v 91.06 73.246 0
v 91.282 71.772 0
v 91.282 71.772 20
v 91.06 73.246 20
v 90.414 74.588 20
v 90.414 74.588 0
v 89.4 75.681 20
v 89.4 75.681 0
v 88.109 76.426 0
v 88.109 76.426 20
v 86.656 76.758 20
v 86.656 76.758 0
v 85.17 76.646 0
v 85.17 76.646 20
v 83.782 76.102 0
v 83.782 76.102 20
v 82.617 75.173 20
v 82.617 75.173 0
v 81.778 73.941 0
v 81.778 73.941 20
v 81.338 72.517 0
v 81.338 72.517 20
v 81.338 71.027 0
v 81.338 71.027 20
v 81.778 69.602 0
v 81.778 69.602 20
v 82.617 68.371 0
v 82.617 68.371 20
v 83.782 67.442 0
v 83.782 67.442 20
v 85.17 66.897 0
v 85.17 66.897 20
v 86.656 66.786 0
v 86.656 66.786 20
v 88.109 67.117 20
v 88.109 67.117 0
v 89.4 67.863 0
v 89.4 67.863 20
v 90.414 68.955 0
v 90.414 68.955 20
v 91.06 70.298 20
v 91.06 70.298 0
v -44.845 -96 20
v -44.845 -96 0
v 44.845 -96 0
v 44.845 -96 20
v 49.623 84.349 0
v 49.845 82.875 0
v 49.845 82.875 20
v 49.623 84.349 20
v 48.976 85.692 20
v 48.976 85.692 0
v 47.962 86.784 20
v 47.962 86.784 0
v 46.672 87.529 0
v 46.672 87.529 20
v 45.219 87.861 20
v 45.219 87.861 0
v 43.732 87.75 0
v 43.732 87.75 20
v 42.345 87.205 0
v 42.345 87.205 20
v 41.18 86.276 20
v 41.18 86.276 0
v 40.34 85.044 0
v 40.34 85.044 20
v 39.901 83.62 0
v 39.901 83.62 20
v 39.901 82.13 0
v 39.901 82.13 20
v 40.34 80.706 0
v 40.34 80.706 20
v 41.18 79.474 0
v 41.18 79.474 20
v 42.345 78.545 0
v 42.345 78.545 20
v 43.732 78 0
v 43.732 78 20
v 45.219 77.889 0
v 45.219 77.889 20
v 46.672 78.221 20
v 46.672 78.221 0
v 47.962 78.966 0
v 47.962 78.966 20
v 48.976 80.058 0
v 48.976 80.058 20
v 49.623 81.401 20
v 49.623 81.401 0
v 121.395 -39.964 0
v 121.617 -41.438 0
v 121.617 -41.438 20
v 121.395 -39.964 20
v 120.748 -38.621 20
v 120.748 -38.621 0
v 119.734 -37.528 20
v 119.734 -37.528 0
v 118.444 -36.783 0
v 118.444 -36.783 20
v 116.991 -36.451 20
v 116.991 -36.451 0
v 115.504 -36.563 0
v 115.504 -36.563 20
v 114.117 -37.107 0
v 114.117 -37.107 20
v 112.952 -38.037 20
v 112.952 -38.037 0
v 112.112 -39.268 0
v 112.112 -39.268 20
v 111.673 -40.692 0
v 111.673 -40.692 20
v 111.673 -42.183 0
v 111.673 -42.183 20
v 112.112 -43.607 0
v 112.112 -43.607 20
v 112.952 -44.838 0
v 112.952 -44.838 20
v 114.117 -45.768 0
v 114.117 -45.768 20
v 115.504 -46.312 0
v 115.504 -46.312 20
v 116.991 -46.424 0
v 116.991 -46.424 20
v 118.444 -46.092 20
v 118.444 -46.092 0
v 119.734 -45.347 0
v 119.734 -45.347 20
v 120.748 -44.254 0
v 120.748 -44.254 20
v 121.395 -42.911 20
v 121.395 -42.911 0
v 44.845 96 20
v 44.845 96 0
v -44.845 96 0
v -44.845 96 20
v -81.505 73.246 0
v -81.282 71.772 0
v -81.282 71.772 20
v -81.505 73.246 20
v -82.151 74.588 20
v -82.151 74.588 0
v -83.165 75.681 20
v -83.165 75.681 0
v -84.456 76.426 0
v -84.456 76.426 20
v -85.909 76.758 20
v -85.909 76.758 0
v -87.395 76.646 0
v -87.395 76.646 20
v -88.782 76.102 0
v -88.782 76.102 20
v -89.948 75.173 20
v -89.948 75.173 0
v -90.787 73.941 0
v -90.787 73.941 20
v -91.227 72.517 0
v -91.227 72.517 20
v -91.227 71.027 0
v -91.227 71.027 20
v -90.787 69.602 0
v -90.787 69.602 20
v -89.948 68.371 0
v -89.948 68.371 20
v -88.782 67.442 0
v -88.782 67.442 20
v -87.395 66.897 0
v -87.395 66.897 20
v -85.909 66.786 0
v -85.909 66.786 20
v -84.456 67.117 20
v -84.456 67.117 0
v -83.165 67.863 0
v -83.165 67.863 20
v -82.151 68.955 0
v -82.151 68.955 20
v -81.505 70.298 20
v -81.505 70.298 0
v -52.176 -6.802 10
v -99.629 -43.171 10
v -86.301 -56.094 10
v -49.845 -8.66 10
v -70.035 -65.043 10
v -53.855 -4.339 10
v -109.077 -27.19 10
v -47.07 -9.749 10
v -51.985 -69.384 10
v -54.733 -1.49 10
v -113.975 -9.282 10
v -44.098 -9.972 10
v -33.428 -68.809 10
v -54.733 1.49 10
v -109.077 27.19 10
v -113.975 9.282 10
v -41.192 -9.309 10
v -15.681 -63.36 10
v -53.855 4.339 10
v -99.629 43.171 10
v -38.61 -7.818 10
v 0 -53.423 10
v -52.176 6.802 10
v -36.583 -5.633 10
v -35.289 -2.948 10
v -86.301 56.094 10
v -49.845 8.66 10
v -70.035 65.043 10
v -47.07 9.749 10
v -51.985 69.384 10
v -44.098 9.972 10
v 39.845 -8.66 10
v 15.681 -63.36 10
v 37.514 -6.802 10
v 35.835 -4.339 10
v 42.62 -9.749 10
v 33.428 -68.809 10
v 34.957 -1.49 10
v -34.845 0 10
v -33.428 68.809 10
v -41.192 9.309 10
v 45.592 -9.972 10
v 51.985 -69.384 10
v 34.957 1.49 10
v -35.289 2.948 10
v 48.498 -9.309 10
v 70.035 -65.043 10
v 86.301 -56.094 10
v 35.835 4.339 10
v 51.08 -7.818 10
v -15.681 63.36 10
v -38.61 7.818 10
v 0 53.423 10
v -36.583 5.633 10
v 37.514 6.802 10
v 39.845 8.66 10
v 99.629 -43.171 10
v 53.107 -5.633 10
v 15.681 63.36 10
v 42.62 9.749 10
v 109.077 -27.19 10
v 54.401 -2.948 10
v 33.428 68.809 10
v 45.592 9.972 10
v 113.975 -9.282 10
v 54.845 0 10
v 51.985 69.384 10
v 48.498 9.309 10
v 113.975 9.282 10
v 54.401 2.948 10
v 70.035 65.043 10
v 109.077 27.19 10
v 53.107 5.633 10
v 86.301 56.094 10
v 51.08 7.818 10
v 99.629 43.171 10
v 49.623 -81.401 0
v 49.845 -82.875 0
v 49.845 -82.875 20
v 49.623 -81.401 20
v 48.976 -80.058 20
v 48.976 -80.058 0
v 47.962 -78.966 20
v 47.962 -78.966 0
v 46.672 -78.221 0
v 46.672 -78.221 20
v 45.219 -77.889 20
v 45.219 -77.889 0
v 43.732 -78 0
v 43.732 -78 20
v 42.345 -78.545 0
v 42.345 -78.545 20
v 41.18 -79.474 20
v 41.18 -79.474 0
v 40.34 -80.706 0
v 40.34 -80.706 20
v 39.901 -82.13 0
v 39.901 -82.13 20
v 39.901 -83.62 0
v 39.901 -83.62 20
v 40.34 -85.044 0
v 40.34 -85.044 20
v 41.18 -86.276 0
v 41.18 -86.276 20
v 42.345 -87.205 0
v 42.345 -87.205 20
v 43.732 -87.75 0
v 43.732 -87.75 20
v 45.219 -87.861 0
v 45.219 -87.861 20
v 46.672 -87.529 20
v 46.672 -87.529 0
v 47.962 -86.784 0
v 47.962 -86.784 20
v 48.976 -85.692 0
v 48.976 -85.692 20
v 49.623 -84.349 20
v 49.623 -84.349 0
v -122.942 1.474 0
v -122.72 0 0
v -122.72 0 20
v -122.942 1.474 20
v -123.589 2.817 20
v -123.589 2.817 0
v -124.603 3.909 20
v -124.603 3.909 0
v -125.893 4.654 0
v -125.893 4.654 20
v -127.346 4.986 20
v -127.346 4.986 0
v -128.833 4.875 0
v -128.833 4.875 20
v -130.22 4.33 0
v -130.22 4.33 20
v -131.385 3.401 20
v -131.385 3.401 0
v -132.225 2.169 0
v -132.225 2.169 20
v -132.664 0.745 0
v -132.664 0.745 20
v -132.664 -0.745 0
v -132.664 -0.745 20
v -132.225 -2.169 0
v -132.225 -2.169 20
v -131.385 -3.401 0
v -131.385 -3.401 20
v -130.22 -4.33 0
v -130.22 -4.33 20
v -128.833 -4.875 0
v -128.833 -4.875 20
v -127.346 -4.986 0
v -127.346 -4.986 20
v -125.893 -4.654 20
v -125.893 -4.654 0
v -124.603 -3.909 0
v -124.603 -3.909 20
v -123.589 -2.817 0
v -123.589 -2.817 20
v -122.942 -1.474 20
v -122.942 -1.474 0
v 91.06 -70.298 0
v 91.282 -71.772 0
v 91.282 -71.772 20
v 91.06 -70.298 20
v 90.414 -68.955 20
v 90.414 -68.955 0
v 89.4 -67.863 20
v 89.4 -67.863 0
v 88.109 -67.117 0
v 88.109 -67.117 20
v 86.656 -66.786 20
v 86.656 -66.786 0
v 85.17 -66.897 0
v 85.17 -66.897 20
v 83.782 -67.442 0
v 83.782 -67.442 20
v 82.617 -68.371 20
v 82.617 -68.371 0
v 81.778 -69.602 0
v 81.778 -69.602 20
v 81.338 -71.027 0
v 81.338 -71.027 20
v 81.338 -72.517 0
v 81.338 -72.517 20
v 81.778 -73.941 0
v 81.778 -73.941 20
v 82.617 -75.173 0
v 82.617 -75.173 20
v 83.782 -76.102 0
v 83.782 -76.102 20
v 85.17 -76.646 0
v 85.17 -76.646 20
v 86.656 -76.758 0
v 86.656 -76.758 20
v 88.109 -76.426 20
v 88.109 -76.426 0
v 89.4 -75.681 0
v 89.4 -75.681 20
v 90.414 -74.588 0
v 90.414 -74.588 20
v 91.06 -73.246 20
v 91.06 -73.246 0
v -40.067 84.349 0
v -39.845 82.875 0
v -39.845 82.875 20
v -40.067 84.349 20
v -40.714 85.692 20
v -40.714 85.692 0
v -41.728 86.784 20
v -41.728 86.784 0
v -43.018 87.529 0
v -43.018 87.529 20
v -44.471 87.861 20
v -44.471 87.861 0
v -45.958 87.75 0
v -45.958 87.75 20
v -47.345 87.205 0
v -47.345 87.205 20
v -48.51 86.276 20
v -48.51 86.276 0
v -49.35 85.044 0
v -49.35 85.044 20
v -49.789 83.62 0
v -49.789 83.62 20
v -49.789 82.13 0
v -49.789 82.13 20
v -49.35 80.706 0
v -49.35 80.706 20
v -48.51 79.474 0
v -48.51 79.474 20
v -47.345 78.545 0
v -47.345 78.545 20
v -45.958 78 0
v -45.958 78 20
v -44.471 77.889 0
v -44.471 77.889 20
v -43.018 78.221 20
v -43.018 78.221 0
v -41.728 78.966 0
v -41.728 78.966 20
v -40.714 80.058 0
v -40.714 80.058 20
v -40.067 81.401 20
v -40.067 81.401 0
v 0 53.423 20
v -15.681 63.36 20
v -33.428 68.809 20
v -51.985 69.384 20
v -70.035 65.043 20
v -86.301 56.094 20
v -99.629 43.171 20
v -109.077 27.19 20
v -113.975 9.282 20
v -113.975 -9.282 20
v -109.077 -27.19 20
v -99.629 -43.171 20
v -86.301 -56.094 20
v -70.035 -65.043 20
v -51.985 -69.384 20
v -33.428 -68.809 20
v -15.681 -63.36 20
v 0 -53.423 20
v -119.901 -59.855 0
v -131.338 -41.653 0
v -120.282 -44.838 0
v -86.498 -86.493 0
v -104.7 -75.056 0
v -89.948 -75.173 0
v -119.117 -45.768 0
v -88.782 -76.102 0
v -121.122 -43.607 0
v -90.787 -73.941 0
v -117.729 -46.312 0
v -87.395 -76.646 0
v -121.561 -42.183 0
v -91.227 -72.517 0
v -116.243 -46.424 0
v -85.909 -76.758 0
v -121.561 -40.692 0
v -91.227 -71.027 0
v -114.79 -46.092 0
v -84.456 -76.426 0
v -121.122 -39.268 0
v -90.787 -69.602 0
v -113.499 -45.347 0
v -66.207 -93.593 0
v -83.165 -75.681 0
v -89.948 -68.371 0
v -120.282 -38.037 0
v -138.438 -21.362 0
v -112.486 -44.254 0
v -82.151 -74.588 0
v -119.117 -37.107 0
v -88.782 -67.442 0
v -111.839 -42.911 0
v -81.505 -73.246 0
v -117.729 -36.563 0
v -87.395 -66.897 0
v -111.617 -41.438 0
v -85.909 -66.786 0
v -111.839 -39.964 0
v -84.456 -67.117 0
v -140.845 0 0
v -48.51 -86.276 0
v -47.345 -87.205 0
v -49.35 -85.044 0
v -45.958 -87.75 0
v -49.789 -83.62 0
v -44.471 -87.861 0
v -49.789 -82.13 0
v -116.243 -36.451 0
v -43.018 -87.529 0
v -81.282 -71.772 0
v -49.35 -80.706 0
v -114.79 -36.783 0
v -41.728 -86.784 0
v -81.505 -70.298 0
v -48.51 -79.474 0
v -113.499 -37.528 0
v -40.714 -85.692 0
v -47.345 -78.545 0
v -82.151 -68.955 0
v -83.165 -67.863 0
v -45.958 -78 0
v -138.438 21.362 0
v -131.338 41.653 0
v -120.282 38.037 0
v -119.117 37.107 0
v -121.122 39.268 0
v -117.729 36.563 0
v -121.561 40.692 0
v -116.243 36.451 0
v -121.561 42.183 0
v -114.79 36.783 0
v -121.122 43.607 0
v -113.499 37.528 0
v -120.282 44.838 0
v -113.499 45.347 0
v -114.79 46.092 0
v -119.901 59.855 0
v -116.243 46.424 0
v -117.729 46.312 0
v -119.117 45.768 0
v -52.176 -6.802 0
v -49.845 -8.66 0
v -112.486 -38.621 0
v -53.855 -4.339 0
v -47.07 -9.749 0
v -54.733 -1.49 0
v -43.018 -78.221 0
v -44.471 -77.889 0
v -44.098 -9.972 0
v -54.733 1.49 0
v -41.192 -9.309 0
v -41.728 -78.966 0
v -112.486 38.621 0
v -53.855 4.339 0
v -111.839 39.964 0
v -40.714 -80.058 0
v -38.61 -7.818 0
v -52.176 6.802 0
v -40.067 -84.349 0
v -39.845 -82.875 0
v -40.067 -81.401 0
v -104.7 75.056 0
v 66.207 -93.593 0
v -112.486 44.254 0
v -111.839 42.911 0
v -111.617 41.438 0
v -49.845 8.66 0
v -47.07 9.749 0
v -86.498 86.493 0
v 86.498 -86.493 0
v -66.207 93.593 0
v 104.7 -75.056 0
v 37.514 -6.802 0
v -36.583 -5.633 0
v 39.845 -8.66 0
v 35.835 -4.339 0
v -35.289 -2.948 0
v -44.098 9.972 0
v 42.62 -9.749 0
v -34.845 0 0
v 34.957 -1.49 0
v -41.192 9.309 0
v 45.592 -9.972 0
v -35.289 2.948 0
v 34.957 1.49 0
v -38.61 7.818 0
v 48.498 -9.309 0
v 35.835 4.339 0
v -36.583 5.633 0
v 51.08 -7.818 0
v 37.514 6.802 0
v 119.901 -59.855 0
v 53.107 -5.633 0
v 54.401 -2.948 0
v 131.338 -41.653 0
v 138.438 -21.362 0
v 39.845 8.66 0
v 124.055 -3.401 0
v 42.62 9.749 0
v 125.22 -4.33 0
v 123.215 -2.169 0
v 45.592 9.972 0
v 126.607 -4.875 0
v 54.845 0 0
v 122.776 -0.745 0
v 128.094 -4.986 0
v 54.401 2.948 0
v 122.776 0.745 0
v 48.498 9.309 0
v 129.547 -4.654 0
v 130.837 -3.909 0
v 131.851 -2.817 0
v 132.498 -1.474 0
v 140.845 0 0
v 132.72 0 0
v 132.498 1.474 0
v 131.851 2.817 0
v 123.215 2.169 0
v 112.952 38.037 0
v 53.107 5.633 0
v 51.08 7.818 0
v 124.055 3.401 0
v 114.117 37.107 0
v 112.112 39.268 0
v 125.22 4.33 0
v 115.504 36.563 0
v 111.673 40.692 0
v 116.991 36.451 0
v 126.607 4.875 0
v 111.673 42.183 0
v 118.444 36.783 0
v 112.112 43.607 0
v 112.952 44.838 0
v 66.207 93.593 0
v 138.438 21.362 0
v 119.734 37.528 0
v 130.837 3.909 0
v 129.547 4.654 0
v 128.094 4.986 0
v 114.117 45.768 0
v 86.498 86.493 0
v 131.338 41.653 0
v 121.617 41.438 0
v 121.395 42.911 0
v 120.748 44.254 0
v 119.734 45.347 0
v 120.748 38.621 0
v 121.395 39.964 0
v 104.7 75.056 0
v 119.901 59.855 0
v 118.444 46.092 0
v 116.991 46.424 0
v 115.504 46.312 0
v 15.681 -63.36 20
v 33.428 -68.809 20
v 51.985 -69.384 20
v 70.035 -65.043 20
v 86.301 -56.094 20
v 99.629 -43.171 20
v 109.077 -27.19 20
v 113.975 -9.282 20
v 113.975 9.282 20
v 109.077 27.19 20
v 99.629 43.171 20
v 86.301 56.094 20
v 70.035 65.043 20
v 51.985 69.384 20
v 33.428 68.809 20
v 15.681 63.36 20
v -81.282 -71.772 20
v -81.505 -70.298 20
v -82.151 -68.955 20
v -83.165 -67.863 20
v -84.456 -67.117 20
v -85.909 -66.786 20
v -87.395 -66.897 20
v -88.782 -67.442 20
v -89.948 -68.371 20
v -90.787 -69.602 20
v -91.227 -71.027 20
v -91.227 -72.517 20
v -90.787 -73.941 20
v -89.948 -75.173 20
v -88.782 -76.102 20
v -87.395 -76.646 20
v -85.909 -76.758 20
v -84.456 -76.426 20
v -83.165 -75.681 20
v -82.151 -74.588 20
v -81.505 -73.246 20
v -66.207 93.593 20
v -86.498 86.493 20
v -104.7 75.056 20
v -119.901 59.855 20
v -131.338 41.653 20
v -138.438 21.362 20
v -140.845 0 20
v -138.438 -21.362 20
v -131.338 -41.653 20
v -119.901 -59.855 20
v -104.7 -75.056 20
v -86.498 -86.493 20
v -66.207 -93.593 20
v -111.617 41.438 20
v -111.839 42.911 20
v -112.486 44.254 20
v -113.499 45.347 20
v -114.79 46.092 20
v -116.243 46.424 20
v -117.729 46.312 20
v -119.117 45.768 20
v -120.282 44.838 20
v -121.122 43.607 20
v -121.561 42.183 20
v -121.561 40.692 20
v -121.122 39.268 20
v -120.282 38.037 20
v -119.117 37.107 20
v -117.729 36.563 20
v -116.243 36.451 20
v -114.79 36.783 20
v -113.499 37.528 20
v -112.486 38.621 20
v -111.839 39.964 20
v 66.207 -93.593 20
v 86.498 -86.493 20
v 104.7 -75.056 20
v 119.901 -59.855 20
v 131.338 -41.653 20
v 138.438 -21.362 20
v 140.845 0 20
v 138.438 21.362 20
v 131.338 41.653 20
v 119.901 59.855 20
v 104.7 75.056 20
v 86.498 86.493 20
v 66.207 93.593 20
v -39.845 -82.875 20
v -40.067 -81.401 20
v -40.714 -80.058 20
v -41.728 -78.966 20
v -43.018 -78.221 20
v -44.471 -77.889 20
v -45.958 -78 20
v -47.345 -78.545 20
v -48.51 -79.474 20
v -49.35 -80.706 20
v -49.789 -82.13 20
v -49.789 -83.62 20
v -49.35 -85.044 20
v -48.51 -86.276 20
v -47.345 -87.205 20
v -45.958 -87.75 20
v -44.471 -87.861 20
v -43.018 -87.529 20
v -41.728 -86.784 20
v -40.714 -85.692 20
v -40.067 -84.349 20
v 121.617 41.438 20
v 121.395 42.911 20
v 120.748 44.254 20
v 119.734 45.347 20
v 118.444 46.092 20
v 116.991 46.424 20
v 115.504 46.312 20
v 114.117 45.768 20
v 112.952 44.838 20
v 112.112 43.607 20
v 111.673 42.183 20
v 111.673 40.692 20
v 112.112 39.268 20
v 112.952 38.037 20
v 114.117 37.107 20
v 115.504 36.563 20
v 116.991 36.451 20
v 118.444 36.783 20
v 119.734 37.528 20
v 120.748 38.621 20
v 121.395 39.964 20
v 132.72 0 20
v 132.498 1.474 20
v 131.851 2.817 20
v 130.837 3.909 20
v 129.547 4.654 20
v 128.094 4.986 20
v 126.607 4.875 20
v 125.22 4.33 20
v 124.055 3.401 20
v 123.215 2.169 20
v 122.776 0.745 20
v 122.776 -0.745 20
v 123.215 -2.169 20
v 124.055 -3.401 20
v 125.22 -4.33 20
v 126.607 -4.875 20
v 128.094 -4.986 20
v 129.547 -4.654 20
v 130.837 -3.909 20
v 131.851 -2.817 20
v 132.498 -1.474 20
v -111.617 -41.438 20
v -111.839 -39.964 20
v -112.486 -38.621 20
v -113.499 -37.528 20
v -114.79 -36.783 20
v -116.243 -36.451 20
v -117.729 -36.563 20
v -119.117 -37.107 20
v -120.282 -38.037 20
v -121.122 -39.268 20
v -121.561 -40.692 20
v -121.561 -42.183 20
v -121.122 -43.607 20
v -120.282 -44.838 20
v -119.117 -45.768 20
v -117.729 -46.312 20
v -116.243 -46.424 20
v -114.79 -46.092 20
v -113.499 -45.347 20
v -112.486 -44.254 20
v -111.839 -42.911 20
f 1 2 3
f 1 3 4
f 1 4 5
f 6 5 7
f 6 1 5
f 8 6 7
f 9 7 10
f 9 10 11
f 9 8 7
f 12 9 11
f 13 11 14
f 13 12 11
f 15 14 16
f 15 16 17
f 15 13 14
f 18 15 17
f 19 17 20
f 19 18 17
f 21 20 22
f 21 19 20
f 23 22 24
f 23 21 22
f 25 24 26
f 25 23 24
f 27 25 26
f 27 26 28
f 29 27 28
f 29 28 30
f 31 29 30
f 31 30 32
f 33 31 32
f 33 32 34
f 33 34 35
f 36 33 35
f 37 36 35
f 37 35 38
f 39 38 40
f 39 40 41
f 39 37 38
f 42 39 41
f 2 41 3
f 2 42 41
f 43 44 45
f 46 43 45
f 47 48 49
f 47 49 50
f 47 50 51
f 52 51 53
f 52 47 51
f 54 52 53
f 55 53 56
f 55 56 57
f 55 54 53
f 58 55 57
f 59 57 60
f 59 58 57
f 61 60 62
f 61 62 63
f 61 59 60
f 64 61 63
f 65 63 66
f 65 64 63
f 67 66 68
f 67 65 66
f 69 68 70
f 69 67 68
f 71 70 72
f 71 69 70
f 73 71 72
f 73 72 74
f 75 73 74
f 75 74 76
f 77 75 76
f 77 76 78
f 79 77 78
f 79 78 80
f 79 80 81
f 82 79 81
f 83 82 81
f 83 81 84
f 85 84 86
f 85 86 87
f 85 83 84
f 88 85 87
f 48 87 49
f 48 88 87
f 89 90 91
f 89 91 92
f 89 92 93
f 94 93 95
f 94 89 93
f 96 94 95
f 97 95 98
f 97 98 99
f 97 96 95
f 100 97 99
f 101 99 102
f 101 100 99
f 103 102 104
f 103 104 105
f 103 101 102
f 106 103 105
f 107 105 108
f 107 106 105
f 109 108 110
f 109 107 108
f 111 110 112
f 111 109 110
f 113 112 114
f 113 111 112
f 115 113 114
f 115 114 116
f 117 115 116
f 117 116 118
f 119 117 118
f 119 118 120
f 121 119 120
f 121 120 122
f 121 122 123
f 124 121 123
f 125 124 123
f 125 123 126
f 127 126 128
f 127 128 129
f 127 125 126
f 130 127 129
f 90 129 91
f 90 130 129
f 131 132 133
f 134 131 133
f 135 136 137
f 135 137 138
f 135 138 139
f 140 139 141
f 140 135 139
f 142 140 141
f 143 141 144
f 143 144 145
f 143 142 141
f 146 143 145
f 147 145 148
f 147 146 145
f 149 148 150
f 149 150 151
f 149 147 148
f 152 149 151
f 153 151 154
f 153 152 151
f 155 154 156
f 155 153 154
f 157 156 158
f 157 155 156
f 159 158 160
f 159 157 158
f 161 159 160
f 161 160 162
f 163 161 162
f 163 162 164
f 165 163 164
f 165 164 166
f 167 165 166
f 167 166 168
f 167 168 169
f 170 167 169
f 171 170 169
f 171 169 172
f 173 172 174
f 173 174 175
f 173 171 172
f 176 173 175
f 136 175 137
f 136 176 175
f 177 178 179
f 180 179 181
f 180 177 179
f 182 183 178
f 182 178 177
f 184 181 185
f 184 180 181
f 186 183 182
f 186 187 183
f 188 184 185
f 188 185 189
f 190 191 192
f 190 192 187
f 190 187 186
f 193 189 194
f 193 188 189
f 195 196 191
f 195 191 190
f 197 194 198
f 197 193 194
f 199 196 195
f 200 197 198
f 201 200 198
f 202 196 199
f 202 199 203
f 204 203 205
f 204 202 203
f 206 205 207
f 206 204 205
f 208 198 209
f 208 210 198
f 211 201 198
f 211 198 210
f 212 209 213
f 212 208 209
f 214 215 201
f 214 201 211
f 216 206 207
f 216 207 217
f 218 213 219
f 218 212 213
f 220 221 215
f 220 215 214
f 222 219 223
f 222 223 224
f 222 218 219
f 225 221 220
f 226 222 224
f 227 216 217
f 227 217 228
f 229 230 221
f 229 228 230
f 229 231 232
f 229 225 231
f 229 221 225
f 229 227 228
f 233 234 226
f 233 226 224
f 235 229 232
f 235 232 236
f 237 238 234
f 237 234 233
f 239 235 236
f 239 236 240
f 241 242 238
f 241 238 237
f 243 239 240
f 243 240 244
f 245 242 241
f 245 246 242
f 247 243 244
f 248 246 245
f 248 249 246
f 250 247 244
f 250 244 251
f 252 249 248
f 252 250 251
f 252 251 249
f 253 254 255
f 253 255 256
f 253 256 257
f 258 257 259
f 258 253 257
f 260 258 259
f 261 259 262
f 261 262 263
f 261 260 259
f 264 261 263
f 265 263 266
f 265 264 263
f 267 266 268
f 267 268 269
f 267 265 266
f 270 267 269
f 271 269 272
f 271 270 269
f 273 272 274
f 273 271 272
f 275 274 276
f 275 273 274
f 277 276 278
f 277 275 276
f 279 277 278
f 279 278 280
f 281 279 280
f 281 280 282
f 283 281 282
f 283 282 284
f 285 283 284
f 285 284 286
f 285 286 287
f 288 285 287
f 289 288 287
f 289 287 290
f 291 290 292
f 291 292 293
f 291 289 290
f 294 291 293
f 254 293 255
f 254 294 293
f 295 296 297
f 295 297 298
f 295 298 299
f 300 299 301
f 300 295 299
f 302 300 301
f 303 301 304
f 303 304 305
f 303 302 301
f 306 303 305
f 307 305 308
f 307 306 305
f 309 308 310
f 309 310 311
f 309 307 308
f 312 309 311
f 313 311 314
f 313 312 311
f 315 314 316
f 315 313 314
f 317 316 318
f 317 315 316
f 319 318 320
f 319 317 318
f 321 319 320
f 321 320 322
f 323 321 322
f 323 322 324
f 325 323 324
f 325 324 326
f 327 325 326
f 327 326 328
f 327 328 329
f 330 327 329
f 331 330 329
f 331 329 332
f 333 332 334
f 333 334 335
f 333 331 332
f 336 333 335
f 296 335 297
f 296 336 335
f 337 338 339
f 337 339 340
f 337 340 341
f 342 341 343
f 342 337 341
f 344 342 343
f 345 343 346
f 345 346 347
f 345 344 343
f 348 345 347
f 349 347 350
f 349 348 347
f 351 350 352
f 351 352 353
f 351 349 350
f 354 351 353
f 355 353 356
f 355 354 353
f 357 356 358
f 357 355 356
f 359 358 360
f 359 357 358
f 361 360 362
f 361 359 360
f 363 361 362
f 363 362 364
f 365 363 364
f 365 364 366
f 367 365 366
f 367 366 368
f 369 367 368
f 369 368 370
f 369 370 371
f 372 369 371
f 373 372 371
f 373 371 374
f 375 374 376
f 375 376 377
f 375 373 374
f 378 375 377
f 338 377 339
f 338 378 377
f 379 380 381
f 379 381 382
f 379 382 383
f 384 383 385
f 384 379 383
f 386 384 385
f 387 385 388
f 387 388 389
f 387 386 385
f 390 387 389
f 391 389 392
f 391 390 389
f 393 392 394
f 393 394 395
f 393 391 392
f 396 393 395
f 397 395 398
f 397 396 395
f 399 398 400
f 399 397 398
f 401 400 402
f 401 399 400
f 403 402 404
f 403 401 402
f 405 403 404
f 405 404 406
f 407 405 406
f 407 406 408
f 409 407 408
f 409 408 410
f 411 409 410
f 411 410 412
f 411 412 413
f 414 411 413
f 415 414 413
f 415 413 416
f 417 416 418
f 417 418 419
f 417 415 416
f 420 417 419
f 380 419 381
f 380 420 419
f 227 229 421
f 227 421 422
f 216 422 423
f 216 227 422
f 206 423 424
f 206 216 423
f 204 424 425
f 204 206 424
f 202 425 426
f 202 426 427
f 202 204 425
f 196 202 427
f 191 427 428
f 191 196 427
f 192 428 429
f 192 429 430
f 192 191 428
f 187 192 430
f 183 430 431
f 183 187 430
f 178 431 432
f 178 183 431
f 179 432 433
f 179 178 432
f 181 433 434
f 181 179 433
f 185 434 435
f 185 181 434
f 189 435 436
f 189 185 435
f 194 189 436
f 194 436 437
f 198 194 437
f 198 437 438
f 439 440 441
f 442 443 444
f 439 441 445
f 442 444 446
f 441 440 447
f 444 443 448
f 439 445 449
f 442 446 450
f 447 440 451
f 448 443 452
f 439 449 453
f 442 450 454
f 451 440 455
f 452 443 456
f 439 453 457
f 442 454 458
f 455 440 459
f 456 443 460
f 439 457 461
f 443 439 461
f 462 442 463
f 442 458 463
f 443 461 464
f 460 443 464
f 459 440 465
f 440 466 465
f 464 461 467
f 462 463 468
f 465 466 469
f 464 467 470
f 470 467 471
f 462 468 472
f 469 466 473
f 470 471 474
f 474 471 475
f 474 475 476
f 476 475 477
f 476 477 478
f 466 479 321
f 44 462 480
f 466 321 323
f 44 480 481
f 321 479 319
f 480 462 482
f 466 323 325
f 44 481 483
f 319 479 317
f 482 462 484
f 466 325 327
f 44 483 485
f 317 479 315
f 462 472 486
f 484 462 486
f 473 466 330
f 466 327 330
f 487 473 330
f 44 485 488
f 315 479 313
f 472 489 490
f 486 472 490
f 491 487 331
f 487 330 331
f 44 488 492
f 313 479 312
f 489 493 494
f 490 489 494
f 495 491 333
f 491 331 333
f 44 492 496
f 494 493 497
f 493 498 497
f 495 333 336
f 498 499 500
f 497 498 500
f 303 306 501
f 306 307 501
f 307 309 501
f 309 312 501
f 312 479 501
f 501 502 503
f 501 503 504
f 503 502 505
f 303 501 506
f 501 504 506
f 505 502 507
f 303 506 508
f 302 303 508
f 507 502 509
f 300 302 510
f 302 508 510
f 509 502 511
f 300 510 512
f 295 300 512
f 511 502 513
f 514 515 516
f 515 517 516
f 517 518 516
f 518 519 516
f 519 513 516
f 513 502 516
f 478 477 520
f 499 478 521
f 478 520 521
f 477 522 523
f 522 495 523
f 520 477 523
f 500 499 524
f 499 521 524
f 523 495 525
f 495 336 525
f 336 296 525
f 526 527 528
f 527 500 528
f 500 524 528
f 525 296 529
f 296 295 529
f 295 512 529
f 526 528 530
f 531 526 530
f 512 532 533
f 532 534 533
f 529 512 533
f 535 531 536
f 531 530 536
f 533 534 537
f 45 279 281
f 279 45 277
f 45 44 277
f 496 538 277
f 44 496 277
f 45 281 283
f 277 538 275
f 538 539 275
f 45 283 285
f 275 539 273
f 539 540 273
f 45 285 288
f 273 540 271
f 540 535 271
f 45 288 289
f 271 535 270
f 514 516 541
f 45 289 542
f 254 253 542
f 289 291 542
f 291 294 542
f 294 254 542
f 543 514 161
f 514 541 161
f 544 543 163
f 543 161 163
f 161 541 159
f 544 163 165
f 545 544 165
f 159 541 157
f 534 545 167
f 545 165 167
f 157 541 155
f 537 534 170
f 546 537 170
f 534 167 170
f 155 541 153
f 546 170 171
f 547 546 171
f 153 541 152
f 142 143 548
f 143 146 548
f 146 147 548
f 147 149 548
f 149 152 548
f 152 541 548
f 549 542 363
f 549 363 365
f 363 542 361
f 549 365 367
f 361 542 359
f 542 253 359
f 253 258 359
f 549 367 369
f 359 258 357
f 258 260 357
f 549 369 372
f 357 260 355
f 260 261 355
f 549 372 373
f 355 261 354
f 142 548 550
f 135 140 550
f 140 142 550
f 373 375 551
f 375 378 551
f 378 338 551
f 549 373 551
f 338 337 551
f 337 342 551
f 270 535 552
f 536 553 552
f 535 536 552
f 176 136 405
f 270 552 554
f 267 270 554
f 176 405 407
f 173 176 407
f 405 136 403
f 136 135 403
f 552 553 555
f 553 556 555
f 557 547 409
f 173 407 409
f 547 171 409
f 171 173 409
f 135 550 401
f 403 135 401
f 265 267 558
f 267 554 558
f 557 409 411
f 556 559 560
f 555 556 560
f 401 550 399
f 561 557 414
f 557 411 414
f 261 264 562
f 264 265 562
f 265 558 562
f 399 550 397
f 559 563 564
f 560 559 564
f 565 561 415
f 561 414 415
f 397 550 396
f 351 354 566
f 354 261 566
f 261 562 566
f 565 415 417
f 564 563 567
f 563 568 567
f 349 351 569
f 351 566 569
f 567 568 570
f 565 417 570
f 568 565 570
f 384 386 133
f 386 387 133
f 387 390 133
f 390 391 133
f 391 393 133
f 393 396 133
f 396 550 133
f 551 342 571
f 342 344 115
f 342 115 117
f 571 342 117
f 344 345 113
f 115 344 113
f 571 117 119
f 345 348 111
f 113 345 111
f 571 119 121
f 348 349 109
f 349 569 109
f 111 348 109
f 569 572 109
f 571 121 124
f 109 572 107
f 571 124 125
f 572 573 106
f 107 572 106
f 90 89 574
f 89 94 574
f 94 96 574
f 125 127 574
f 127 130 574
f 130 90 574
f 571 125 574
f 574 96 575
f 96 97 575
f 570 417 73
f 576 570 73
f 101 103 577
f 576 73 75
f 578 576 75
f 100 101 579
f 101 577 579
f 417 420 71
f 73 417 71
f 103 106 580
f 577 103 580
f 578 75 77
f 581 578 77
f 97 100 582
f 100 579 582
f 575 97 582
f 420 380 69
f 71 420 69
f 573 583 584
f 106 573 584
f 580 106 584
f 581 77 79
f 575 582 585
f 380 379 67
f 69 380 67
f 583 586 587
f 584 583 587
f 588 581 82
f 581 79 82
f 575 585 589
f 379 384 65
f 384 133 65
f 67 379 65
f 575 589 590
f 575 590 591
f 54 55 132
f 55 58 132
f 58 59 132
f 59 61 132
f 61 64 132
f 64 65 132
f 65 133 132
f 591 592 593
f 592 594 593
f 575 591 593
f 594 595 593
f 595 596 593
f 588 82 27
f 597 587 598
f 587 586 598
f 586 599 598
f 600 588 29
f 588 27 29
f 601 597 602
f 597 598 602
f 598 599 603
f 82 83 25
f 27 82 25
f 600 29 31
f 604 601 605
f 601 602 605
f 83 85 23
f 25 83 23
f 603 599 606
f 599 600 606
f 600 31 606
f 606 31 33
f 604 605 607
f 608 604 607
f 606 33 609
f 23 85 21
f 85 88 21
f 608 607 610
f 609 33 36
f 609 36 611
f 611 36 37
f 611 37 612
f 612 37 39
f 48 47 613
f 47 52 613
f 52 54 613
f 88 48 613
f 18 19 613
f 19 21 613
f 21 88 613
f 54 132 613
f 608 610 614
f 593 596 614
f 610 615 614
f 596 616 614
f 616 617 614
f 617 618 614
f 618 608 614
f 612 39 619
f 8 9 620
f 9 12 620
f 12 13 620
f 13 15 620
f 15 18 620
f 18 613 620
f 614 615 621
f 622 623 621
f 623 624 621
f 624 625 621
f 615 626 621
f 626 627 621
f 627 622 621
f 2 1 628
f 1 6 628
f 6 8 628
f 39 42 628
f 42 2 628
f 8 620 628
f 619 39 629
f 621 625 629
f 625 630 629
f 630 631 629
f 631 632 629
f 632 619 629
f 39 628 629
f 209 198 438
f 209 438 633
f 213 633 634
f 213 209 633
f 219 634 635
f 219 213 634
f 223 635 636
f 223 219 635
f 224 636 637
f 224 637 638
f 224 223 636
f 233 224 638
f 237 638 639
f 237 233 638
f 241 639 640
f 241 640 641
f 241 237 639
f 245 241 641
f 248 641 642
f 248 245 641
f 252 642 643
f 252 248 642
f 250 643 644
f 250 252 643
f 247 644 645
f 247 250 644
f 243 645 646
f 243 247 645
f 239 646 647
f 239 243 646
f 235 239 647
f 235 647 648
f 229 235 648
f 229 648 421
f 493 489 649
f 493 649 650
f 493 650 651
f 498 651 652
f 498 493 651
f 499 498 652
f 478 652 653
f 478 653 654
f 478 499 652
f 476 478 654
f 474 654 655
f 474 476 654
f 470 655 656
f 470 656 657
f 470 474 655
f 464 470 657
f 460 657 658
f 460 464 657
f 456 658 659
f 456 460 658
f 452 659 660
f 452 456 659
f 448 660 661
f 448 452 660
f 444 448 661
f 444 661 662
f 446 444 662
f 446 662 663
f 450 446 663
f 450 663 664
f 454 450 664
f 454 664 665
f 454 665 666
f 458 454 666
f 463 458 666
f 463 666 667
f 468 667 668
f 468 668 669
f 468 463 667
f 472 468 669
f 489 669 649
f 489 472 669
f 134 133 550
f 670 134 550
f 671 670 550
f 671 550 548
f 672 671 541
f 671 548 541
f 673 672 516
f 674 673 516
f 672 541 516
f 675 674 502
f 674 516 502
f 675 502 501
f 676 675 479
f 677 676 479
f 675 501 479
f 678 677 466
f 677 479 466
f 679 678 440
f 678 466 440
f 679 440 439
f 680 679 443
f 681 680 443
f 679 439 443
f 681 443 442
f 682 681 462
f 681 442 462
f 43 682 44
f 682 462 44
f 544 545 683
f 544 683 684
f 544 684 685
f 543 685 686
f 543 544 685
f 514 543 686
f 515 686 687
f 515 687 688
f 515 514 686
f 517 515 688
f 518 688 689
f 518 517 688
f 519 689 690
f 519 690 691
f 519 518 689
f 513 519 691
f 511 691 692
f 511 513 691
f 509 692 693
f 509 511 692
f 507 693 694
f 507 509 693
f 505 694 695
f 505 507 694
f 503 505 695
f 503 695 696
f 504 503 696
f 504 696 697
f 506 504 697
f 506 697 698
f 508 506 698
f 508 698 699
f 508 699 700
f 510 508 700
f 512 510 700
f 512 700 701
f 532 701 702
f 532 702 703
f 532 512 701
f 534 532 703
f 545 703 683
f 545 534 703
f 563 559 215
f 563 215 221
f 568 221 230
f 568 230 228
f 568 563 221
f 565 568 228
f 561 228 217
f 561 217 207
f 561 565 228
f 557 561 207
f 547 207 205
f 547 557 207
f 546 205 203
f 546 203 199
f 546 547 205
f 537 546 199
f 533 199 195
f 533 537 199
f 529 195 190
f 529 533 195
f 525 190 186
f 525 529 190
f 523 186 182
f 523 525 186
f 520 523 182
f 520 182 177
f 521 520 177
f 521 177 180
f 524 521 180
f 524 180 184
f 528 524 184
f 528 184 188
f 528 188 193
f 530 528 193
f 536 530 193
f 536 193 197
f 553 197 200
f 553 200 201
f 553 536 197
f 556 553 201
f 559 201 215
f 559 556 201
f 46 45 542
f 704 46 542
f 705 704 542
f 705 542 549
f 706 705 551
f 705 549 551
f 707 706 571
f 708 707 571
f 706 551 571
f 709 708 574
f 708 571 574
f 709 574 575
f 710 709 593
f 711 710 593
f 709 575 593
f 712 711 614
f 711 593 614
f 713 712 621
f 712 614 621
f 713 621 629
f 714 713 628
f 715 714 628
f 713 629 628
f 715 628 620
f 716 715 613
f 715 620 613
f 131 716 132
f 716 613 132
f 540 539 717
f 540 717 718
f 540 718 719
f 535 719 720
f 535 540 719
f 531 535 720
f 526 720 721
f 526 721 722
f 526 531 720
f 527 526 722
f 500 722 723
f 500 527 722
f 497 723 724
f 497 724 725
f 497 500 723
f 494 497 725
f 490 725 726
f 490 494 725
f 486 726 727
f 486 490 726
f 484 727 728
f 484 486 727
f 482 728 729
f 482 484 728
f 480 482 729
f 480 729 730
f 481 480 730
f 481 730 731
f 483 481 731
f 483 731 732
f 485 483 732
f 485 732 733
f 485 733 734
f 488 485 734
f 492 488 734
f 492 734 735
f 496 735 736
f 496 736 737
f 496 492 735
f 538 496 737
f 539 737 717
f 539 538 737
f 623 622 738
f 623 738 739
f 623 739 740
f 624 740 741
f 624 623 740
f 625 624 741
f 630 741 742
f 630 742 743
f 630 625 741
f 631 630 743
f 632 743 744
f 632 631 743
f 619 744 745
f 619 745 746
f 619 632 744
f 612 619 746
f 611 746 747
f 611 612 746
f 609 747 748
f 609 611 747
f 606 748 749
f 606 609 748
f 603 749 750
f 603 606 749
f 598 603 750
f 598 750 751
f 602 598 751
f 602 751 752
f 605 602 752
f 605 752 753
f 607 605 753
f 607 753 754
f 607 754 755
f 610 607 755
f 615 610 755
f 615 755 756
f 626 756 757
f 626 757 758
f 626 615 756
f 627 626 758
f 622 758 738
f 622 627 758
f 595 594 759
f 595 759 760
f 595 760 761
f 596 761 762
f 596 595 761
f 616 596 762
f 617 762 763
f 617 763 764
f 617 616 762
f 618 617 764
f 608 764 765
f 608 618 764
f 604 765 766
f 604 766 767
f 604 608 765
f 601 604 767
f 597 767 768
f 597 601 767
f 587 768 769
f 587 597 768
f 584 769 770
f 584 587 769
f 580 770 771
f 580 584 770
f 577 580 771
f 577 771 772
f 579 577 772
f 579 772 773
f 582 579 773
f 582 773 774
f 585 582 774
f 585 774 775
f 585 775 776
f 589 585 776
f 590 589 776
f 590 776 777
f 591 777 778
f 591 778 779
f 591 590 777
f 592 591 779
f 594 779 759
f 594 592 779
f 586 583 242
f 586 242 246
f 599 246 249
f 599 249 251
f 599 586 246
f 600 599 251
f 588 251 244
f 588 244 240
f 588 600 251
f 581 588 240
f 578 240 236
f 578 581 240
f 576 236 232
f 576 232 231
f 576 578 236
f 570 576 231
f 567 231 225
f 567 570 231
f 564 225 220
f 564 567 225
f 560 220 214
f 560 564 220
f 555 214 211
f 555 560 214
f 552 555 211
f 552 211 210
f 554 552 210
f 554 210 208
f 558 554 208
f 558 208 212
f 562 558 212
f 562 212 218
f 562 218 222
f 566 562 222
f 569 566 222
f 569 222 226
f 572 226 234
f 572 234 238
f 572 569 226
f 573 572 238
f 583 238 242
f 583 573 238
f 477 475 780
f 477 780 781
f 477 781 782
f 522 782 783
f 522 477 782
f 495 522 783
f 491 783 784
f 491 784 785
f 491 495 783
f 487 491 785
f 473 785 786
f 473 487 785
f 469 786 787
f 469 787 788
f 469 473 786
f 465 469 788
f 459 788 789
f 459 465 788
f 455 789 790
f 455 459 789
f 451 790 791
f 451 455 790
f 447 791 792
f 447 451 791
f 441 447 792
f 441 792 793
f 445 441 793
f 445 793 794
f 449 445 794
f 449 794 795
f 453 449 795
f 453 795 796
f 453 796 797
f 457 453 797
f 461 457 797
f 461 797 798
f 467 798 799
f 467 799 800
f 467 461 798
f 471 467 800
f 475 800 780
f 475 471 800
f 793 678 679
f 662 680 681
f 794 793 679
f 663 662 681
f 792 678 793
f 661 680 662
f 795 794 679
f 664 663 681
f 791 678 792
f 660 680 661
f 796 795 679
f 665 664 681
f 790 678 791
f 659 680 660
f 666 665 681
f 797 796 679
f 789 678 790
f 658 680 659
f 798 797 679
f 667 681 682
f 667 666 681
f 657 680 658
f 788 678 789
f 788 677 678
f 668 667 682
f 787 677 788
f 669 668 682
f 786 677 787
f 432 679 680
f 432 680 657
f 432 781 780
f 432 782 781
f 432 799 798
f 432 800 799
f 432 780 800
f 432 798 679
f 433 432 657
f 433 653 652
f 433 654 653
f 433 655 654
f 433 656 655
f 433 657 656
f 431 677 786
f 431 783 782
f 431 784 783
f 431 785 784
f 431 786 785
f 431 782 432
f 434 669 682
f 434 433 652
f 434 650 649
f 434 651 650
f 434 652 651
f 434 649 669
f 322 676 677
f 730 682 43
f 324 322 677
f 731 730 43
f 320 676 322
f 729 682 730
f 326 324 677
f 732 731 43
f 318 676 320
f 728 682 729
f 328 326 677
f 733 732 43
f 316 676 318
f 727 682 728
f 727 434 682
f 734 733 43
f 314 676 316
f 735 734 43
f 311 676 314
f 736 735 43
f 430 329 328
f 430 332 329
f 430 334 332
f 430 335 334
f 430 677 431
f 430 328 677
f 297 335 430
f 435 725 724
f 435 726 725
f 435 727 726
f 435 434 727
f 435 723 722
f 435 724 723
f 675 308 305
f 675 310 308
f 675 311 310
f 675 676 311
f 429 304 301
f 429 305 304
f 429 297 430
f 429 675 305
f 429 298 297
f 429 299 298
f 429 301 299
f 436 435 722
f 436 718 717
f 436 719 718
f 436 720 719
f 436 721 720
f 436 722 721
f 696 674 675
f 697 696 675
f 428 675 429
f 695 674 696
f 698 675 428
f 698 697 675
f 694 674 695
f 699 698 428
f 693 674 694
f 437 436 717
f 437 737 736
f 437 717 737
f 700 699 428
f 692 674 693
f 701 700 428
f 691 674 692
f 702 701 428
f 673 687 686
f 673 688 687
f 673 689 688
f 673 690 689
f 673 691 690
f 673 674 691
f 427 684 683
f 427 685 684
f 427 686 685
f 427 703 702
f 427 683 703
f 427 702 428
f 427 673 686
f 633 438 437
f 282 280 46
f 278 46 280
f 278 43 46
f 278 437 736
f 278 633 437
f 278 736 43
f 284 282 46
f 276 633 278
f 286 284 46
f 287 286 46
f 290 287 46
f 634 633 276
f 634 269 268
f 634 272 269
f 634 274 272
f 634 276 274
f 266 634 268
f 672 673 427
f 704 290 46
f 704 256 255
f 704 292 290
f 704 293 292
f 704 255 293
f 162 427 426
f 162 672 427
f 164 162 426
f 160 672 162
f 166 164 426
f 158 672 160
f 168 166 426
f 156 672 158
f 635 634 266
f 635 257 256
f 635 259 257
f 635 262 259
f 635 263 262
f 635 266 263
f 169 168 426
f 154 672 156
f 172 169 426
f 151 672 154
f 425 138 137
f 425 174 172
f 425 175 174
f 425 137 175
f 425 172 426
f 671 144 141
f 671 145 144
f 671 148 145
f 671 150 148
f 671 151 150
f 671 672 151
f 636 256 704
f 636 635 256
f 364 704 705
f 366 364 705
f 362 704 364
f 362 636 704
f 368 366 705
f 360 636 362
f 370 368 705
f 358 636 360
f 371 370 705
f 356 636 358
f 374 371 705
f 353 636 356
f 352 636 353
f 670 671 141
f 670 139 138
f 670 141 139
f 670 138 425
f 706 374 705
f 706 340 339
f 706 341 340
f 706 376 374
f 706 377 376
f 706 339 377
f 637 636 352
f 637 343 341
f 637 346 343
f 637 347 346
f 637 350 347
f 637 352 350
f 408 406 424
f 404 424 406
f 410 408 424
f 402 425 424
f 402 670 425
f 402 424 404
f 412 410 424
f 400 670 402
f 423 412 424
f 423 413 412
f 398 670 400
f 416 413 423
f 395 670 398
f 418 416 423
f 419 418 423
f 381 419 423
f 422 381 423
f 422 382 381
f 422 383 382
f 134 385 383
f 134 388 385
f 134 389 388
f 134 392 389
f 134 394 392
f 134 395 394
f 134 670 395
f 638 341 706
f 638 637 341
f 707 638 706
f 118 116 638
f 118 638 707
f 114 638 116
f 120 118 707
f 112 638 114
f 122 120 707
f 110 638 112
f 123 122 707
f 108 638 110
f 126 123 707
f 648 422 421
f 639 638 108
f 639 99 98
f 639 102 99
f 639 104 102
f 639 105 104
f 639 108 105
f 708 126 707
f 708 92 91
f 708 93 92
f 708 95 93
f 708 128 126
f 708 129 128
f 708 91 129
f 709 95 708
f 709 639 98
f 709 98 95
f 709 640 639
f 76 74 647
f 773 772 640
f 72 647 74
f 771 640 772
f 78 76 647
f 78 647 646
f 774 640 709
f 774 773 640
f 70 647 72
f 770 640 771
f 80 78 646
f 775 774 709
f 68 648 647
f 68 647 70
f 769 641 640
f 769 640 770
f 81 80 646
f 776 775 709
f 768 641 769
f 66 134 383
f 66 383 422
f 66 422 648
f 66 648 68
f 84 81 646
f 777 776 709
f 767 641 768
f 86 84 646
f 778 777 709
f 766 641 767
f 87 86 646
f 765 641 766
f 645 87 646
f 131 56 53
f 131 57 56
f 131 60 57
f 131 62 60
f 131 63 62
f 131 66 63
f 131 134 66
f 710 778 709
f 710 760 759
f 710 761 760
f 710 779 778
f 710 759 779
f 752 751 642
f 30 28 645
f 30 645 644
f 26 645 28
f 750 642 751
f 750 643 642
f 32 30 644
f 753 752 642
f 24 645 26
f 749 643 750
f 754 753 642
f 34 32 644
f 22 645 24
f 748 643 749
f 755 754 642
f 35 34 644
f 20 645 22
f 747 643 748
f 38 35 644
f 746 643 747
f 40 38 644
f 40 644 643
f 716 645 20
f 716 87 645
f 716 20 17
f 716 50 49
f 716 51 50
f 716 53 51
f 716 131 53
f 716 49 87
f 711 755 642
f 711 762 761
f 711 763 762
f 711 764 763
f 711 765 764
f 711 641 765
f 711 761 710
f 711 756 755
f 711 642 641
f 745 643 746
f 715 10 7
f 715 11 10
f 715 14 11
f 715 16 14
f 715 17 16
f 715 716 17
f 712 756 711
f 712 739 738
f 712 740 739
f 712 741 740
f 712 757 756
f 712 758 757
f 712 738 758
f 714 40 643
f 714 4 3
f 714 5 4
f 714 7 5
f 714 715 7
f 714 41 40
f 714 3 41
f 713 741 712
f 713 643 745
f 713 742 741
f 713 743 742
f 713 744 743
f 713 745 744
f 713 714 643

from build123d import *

# Parameters (mm, degrees)
IZIM1_R                     = 5
Y_KSEKLIK_EKSTR_ZYON1_DEPTH = 20
IZIM1_3_R                   = 10
Y_KSEKLIK_EKSTR_ZYON2_DEPTH = 10
Y_KSEKLIK_EKSTR_ZYON3_DEPTH = 20


with BuildPart() as part:
    # Çizim1 → Yükseklik-Ekstrüzyon1 (new body)
    with BuildSketch(Plane.XY):
        with BuildLine():
            ThreePointArc((-44.845, 96), (-140.845, 0), (-44.845, -96))
            ThreePointArc((-44.845, -96), (-21.743660159, -93.179011035), (0, -84.881835365))
            ThreePointArc((0, -84.881835365), (21.743660159, -93.179011035), (44.845, -96))
            ThreePointArc((44.845, -96), (140.845, 0), (44.845, 96))
            ThreePointArc((44.845, 96), (21.743660159, 93.179011035), (0, 84.881835365))
            ThreePointArc((0, 84.881835365), (-21.743660159, 93.179011035), (-44.845, 96))
        make_face()
        with Locations((-86.2825, -71.771855339)):
            Circle(IZIM1_R, mode=Mode.SUBTRACT)
        with Locations((-44.845, -82.875)):
            Circle(IZIM1_R, mode=Mode.SUBTRACT)
        with Locations((-116.616855339, -41.4375)):
            Circle(IZIM1_R, mode=Mode.SUBTRACT)
        with Locations((44.845, -82.875)):
            Circle(IZIM1_R, mode=Mode.SUBTRACT)
        with Locations((86.2825, -71.771855339)):
            Circle(IZIM1_R, mode=Mode.SUBTRACT)
        with Locations((116.616855339, -41.4375)):
            Circle(IZIM1_R, mode=Mode.SUBTRACT)
        with Locations((-127.72, 0)):
            Circle(IZIM1_R, mode=Mode.SUBTRACT)
        with Locations((-116.616855339, 41.4375)):
            Circle(IZIM1_R, mode=Mode.SUBTRACT)
        with Locations((-86.2825, 71.771855339)):
            Circle(IZIM1_R, mode=Mode.SUBTRACT)
        with Locations((-44.845, 82.875)):
            Circle(IZIM1_R, mode=Mode.SUBTRACT)
        with BuildLine():
            ThreePointArc((0, -53.422733691), (-114.595, 0), (0, 53.422733691))
            ThreePointArc((0, 53.422733691), (114.595, 0), (0, -53.422733691))
        make_face(mode=Mode.SUBTRACT)
        with Locations((127.72, 0)):
            Circle(IZIM1_R, mode=Mode.SUBTRACT)
        with Locations((116.616855339, 41.4375)):
            Circle(IZIM1_R, mode=Mode.SUBTRACT)
        with Locations((44.845, 82.875)):
            Circle(IZIM1_R, mode=Mode.SUBTRACT)
        with Locations((86.2825, 71.771855339)):
            Circle(IZIM1_R, mode=Mode.SUBTRACT)
    extrude(amount=Y_KSEKLIK_EKSTR_ZYON1_DEPTH)

    # Çizim1<3> → Yükseklik-Ekstrüzyon2 (add)
    with BuildSketch(Plane.XY):
        with BuildLine():
            ThreePointArc((0, -53.422733691), (114.595, 0), (0, 53.422733691))
            ThreePointArc((0, 53.422733691), (-114.595, 0), (0, -53.422733691))
        make_face()
        with Locations((-44.845, 0)):
            Circle(IZIM1_3_R, mode=Mode.SUBTRACT)
        with Locations((44.845, 0)):
            Circle(IZIM1_3_R, mode=Mode.SUBTRACT)
    extrude(amount=Y_KSEKLIK_EKSTR_ZYON2_DEPTH)

    # Çizim1<5> → Yükseklik-Ekstrüzyon3 (add)
    with BuildSketch(Plane.XY):
        with BuildLine():
            ThreePointArc((0, -84.881835365), (-21.743660159, -93.179011035), (-44.845, -96))
            Line((-44.845, -96), (44.845, -96))
            ThreePointArc((44.845, -96), (21.743660159, -93.179011035), (0, -84.881835365))
        make_face()
        with BuildLine():
            Line((44.845, 96), (-44.845, 96))
            ThreePointArc((-44.845, 96), (-21.743660159, 93.179011035), (0, 84.881835365))
            ThreePointArc((0, 84.881835365), (21.743660159, 93.179011035), (44.845, 96))
        make_face()
    extrude(amount=Y_KSEKLIK_EKSTR_ZYON3_DEPTH)


solid = part.part
